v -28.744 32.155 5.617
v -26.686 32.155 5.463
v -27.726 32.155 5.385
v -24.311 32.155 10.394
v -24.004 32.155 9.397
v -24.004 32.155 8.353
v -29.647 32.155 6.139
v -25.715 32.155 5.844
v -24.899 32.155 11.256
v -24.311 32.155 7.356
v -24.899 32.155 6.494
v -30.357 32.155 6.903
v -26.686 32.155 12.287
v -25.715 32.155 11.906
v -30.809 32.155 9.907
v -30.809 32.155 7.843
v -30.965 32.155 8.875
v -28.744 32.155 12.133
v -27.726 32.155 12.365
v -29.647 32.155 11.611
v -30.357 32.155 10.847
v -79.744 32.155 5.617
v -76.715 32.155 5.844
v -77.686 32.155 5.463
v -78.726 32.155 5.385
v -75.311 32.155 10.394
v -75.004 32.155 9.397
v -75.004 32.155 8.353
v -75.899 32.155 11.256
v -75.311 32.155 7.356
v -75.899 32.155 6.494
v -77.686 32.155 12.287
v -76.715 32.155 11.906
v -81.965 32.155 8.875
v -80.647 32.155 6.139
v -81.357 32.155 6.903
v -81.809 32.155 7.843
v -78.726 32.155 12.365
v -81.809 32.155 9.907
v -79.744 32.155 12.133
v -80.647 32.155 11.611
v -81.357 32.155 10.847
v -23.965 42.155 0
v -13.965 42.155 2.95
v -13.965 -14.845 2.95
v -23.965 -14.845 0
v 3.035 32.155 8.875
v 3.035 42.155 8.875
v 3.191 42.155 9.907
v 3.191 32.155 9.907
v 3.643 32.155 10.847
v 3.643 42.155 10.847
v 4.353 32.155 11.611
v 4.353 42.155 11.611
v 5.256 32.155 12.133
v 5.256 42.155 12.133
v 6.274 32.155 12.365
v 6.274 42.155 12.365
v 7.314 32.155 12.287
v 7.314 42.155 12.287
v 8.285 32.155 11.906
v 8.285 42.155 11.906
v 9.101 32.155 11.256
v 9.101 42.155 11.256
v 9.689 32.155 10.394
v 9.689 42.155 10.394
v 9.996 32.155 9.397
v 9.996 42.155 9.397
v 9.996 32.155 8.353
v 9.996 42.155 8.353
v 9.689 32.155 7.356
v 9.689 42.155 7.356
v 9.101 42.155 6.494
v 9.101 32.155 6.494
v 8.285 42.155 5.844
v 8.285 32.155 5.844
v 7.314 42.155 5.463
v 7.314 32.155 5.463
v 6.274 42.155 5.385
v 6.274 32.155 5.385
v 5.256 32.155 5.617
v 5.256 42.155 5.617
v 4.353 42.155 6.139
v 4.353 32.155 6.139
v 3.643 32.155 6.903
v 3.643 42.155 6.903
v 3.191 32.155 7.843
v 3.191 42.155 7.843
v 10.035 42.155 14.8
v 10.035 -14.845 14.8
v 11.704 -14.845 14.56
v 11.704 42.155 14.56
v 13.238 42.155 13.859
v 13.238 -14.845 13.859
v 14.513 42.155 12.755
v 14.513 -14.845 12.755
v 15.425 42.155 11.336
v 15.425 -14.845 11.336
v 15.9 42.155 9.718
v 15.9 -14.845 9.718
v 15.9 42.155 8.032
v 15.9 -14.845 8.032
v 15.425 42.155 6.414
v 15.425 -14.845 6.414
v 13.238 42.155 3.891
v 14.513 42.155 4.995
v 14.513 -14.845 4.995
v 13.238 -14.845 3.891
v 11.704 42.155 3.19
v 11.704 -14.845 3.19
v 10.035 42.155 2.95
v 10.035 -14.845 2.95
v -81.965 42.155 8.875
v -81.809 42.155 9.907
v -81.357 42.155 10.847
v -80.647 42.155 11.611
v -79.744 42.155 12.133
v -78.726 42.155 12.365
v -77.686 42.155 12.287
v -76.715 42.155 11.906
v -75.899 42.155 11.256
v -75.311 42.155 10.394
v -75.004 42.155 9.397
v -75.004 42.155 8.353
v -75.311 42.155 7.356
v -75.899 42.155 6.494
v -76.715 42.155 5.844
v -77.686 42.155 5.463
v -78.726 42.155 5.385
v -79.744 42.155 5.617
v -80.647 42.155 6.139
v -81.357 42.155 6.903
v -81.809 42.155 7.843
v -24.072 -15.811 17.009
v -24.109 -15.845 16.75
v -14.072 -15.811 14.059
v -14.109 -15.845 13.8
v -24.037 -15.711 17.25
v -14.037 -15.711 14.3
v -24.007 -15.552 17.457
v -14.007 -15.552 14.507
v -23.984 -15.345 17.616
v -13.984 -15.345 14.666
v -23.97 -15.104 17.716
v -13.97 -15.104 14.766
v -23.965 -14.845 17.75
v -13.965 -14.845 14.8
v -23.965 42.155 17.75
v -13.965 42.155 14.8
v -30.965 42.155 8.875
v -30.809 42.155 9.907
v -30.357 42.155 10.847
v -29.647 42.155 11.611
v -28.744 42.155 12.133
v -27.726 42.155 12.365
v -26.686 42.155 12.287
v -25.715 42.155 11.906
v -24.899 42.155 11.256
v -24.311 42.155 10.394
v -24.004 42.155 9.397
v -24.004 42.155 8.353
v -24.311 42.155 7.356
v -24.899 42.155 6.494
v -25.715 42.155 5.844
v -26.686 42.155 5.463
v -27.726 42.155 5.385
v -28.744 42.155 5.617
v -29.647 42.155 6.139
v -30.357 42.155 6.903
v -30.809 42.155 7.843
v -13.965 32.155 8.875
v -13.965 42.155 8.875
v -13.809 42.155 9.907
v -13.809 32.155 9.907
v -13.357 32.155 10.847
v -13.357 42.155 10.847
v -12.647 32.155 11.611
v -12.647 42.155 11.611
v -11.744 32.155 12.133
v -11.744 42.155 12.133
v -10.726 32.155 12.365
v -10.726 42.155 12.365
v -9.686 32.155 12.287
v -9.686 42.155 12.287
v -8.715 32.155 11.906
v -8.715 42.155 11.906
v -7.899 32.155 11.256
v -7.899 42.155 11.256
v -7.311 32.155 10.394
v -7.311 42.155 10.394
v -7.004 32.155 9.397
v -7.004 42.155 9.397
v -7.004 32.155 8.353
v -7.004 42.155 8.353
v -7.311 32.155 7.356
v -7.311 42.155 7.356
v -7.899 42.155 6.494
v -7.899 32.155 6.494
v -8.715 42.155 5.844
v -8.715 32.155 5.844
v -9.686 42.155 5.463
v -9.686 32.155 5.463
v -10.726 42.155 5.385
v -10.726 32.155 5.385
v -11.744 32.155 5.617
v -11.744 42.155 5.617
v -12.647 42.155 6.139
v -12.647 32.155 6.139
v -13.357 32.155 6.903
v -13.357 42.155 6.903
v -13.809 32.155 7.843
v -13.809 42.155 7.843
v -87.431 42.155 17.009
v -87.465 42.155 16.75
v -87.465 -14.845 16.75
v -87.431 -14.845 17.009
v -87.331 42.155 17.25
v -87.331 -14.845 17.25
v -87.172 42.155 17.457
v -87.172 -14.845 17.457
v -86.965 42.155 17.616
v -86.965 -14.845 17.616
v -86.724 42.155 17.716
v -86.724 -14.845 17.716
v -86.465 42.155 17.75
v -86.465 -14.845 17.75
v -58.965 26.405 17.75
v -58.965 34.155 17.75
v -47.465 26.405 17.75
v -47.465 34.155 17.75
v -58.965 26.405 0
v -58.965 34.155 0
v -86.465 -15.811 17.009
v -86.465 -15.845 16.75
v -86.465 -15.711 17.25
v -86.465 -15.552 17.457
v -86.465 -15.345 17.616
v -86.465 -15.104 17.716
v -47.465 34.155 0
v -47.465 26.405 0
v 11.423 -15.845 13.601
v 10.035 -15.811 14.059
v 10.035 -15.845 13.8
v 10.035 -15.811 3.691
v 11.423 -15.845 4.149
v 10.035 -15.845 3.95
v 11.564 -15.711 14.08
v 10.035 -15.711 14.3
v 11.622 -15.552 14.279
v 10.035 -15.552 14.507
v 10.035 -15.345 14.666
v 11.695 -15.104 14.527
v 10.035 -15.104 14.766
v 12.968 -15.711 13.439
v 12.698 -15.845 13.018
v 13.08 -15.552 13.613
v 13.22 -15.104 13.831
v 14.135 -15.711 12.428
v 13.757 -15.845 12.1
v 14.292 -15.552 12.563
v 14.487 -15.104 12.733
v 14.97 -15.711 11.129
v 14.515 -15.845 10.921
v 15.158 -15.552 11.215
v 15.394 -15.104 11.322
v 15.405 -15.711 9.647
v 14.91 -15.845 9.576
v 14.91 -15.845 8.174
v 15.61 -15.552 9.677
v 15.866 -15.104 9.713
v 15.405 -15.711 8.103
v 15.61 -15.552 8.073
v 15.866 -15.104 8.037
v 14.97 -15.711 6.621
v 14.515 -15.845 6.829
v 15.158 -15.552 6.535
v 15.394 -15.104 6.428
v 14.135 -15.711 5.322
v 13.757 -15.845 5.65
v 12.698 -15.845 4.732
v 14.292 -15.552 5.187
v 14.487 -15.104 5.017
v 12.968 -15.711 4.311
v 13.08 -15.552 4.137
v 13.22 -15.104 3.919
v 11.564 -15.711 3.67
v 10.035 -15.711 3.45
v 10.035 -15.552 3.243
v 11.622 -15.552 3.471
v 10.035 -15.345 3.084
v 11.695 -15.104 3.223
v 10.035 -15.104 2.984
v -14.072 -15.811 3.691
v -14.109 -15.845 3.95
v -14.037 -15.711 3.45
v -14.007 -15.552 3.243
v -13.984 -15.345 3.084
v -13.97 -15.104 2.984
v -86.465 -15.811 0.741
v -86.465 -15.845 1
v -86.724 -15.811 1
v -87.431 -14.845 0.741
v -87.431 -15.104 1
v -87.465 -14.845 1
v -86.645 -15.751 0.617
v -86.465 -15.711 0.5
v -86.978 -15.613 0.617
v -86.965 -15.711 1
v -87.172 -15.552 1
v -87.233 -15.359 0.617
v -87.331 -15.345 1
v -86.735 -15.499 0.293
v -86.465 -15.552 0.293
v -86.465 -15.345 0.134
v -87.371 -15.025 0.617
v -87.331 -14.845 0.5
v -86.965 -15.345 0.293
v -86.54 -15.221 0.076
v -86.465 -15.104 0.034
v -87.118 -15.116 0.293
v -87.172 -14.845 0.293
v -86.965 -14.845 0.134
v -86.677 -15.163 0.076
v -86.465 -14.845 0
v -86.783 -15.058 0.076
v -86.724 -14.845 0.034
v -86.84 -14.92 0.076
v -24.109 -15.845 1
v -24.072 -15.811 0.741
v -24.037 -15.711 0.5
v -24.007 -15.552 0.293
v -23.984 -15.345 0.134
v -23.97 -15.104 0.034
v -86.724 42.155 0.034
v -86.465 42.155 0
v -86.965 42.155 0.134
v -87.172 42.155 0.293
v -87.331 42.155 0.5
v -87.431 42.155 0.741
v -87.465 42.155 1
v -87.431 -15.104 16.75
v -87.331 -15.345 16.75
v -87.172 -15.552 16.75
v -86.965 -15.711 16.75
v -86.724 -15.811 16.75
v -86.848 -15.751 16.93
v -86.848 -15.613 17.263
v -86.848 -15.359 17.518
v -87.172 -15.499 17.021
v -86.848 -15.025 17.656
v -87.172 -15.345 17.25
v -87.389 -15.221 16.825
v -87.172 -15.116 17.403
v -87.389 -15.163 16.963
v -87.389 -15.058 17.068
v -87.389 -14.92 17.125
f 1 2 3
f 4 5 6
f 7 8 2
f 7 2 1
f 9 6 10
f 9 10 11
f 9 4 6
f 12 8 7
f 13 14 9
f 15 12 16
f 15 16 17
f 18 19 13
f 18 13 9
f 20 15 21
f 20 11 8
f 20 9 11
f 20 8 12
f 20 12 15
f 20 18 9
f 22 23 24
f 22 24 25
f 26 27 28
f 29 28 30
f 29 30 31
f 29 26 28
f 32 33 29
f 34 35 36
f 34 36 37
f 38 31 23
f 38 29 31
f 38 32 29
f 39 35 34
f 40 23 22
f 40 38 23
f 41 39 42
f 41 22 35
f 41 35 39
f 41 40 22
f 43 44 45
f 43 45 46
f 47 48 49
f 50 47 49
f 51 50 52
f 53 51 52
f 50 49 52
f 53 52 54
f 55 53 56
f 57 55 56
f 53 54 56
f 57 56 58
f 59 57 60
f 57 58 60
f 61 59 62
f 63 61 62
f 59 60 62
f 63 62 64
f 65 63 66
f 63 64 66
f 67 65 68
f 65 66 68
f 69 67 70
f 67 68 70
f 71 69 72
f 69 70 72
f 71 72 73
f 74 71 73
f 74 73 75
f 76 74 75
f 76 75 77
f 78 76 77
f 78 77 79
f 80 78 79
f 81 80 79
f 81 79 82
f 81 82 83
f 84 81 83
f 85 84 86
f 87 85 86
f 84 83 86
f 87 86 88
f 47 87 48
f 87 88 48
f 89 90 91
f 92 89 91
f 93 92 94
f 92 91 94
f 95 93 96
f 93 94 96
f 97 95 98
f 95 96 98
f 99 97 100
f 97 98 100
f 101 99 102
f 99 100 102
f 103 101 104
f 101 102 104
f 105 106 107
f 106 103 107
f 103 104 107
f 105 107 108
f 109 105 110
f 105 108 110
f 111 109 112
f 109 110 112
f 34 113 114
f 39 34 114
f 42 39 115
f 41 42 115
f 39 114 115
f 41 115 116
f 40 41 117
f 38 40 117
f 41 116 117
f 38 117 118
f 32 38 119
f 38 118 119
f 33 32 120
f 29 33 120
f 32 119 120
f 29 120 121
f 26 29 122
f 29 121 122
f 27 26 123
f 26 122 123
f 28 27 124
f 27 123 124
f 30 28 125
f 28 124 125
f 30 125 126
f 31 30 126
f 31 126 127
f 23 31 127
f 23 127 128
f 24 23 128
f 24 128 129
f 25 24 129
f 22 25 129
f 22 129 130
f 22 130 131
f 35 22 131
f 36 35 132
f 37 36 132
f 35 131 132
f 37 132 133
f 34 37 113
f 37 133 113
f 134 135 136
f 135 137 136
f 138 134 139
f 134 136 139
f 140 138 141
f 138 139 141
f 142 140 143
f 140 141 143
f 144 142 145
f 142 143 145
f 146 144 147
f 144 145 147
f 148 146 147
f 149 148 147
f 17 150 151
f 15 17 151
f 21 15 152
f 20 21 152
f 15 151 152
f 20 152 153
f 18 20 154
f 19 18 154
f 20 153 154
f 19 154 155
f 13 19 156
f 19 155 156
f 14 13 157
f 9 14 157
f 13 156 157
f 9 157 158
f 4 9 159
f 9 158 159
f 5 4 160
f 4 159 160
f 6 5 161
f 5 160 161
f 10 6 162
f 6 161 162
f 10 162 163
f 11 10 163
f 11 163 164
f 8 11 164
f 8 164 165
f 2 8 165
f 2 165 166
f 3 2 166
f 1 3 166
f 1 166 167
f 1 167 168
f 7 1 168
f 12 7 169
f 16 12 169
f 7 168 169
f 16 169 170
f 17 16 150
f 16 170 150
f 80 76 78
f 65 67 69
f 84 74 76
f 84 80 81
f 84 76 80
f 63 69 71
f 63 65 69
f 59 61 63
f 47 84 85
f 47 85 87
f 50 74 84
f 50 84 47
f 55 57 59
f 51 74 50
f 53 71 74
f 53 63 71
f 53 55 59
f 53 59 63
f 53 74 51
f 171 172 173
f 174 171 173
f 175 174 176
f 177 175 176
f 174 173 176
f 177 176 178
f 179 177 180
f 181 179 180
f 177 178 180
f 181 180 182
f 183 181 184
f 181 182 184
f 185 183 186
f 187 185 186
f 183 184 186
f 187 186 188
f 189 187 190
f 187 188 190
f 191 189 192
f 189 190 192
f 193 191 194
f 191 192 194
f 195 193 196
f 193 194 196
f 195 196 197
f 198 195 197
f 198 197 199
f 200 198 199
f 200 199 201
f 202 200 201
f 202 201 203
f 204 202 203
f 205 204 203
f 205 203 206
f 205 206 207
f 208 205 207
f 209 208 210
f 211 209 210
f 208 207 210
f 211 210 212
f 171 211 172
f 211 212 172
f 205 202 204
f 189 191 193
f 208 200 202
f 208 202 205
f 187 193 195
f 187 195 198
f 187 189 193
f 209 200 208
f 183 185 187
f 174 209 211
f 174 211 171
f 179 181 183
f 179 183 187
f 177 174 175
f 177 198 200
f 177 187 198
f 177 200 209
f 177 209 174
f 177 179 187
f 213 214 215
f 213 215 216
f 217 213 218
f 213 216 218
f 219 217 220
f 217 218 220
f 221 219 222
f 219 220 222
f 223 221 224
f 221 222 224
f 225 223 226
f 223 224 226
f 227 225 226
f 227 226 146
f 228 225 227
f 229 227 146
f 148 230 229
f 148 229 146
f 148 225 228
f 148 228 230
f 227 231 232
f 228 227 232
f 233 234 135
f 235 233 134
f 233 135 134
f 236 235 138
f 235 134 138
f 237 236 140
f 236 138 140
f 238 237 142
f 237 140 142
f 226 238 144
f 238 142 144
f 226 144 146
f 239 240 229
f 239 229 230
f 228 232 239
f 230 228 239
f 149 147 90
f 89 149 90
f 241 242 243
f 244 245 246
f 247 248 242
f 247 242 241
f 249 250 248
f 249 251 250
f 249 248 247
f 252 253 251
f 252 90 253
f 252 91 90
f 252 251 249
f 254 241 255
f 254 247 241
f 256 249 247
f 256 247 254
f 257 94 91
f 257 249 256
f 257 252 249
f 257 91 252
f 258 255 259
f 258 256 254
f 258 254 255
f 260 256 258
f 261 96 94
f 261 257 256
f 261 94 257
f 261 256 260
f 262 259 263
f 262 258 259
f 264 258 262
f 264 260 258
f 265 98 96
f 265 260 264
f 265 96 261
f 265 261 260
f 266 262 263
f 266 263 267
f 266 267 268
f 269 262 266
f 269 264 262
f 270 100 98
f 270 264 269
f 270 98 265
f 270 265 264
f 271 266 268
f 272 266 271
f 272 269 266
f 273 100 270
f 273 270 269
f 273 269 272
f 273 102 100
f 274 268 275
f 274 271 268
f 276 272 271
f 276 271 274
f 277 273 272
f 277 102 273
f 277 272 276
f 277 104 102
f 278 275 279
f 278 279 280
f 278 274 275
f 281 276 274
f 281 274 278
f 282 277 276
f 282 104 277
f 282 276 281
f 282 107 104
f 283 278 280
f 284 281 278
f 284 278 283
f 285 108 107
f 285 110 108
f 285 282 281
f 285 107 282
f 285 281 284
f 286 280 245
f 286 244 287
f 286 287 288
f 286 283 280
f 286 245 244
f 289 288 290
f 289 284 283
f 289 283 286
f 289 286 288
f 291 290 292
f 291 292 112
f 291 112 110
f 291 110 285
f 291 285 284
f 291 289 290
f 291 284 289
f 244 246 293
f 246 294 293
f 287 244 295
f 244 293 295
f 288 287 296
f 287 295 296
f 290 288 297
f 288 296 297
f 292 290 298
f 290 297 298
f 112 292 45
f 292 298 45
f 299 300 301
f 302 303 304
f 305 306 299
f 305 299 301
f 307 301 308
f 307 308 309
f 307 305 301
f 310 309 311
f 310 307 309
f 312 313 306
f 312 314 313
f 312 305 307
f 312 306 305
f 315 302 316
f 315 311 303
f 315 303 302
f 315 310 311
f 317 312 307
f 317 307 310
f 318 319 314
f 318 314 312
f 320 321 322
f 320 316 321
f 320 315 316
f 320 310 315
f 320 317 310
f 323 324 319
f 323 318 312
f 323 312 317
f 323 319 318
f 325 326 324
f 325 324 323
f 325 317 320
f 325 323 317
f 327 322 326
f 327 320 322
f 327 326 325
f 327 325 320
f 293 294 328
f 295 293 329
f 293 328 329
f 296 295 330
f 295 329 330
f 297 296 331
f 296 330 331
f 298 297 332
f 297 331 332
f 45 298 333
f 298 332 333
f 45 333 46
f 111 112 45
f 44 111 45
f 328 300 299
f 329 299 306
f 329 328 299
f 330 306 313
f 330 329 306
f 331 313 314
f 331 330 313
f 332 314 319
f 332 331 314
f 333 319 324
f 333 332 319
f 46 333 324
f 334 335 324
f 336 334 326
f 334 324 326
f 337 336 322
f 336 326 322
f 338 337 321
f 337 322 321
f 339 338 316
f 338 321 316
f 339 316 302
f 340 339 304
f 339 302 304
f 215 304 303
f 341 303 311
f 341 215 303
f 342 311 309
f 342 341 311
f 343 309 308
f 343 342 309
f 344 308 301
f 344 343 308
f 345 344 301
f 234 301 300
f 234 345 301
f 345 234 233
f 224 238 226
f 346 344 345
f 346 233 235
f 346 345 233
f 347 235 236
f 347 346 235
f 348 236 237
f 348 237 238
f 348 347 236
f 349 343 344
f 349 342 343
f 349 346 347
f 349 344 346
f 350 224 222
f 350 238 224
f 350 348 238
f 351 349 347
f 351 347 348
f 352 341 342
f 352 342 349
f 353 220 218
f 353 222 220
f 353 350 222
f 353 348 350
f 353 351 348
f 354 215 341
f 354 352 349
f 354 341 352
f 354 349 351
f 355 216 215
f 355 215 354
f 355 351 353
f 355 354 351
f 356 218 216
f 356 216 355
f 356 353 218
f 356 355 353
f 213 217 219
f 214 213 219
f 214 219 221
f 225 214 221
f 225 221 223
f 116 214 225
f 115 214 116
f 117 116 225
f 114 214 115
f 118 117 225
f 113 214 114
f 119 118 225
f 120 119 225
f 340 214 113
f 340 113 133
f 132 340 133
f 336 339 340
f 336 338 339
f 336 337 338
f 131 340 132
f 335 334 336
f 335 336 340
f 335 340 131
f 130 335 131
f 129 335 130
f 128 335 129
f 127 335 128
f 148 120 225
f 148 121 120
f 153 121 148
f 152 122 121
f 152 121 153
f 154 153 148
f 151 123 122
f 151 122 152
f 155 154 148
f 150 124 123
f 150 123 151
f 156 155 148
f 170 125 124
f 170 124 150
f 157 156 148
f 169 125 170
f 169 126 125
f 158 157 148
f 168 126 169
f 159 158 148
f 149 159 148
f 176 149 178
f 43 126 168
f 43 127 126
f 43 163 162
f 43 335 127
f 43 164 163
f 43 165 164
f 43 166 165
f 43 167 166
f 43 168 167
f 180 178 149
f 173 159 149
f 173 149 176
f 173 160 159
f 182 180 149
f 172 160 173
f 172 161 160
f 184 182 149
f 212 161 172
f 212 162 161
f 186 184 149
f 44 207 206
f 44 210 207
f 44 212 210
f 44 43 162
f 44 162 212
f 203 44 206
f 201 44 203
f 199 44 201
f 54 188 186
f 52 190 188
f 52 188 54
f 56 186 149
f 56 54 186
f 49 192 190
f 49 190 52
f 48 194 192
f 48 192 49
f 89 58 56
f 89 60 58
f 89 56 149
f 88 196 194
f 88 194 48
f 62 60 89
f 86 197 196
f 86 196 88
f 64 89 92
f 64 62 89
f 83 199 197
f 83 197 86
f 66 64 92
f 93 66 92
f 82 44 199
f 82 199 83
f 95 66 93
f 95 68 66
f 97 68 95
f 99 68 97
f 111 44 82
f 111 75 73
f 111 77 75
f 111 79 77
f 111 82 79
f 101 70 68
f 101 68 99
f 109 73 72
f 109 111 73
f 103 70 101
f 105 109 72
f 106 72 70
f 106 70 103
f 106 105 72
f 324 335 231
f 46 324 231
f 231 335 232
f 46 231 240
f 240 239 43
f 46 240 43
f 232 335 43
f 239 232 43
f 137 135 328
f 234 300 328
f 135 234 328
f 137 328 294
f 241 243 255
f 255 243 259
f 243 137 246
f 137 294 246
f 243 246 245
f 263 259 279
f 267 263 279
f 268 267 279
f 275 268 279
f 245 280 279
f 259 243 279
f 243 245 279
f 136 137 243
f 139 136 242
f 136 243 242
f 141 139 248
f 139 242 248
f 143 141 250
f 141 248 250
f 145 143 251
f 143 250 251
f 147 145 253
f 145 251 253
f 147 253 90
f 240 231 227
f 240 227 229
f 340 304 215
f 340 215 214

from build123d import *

# Parameters (mm, degrees)
SKETCH1_W                            = 104
SKETCH1_H                            = 58
SKETCH1_W_2                          = 11.5
SKETCH1_H_2                          = 7.75
MODULAR_MAIN_BODY_DEPTH              = 17.75
FRONT_CUT_OUT_DEPTH                  = 107.43853951
SKETCH5_R                            = 3.5
MODULAR_INTERFACE_DEEP_CUT_OUT_DEPTH = 10
FILLET1_R                            = 1
FILLET3_R                            = 1


with BuildPart() as part:
    # Sketch1 → modular_main_body (new body)
    with BuildSketch(Plane.XY):
        with Locations((-35.464851186, 13.154761905)):
            Rectangle(SKETCH1_W, SKETCH1_H)
        with Locations((-53.214851186, 30.279761905)):
            Rectangle(SKETCH1_W_2, SKETCH1_H_2, mode=Mode.SUBTRACT)
    extrude(amount=MODULAR_MAIN_BODY_DEPTH)

    # Sketch2 → front_cut_out (cut, through all)
    with BuildSketch(Plane.XZ.offset(15.845238095)):
        with BuildLine():
            Line((-23.964851186, 17.75), (-13.964851186, 14.8))
            Line((-13.964851186, 14.8), (10.035148814, 14.8))
            ThreePointArc((10.035148814, 14.8), (15.960148814, 8.875), (10.035148814, 2.95))
            Line((10.035148814, 2.95), (-13.964851186, 2.95))
            Line((-13.964851186, 2.95), (-23.964851186, 0))
            Line((-23.964851186, 0), (16.535148814, 0))
            Line((16.535148814, 0), (16.535148814, 17.75))
            Line((16.535148814, 17.75), (-23.964851186, 17.75))
        make_face()
    extrude(amount=-FRONT_CUT_OUT_DEPTH, mode=Mode.SUBTRACT)

    # Sketch5 → modular_interface_deep_cut_out (cut)
    with BuildSketch(Plane(origin=(0, 42.154761905, 0), x_dir=(1, 0, 0), z_dir=(0, 1, 0))):
        with Locations(Location((-78.464851186, -8.875, 0), (0, 0, 180))):
            Circle(SKETCH5_R)
        with Locations(Location((-27.464851186, -8.875, 0), (0, 0, 180))):
            Circle(SKETCH5_R)
        with Locations(Location((-10.464851186, -8.875, 0), (0, 0, 180))):
            Circle(SKETCH5_R)
        with Locations(Location((6.535148814, -8.875, 0), (0, 0, 180))):
            Circle(SKETCH5_R)
    extrude(amount=-MODULAR_INTERFACE_DEEP_CUT_OUT_DEPTH, mode=Mode.SUBTRACT)

    # Fillet1
    fillet1_edges = [part.edges().sort_by_distance(p)[0] for p in [
        (-18.964851186, -15.845238095, 16.275),
        (-1.964851186, -15.845238095, 14.8),
        (15.960148814, -15.845238095, 8.875),
        (-1.964851186, -15.845238095, 2.95),
        (-18.964851186, -15.845238095, 1.475),
        (-55.714851186, -15.845238095, 0),
        (-55.714851186, -15.845238095, 17.75),
        (-87.464851186, -15.845238095, 8.875),
    ]]
    fillet(fillet1_edges, radius=FILLET1_R)

    # Fillet3
    # the kernel refuses this fillet: 1 mm, written as the material it takes off along each edge
    with BuildSketch(Plane(origin=(-86.464851186, -14.845238095, 16.75), x_dir=(0, 0, 1), z_dir=(-1, 0, 0))) as fillet3_piece_1_section:
        Polygon((0, 0), (FILLET3_R, 0), (FILLET3_R, -FILLET3_R), (0, -FILLET3_R), align=None)
    fillet3_piece_1 = extrude(amount=FILLET3_R, mode=Mode.PRIVATE)
    fillet3_piece_1 = fillet3_piece_1 - Plane(origin=(-86.464851186, -14.845238095, 16.75), x_dir=(0, 0.7071067811865475, -0.7071067811865475), z_dir=(-1, 0, 0)) * Sphere(FILLET3_R, mode=Mode.PRIVATE)
    add(fillet3_piece_1, mode=Mode.SUBTRACT)
    with BuildSketch(Plane(origin=(-86.464851186, -14.845238095, 1), x_dir=(-1, 0, 0), z_dir=(0, 0, -1))) as fillet3_piece_2_section:
        Polygon((0, 0), (FILLET3_R, 0), (FILLET3_R, -FILLET3_R), (0, -FILLET3_R), align=None)
    fillet3_piece_2 = extrude(amount=FILLET3_R, mode=Mode.PRIVATE)
    fillet3_piece_2 = fillet3_piece_2 - Plane(origin=(-86.464851186, -14.845238095, 1), x_dir=(0.7071067811865475, 0.7071067811865475, 0), z_dir=(0, 0, -1)) * Sphere(FILLET3_R, mode=Mode.PRIVATE)
    add(fillet3_piece_2, mode=Mode.SUBTRACT)
    with BuildSketch(Plane(origin=(-87.464851186, -14.845238095, 17.75), x_dir=(0, 0, -1), z_dir=(0, 1, 0)), Plane(origin=(-87.464851186, -14.845238095, 0), x_dir=(1, 0, 0), z_dir=(0, 1, 0))) as fillet3_piece_3:
        with BuildLine():
            CenterArc((FILLET3_R, -FILLET3_R), FILLET3_R, 90, 90)
            Line((0, -FILLET3_R), (0, 0))
            Line((0, 0), (FILLET3_R, 0))
        make_face()
    extrude(amount=59.5, mode=Mode.SUBTRACT)


solid = part.part
